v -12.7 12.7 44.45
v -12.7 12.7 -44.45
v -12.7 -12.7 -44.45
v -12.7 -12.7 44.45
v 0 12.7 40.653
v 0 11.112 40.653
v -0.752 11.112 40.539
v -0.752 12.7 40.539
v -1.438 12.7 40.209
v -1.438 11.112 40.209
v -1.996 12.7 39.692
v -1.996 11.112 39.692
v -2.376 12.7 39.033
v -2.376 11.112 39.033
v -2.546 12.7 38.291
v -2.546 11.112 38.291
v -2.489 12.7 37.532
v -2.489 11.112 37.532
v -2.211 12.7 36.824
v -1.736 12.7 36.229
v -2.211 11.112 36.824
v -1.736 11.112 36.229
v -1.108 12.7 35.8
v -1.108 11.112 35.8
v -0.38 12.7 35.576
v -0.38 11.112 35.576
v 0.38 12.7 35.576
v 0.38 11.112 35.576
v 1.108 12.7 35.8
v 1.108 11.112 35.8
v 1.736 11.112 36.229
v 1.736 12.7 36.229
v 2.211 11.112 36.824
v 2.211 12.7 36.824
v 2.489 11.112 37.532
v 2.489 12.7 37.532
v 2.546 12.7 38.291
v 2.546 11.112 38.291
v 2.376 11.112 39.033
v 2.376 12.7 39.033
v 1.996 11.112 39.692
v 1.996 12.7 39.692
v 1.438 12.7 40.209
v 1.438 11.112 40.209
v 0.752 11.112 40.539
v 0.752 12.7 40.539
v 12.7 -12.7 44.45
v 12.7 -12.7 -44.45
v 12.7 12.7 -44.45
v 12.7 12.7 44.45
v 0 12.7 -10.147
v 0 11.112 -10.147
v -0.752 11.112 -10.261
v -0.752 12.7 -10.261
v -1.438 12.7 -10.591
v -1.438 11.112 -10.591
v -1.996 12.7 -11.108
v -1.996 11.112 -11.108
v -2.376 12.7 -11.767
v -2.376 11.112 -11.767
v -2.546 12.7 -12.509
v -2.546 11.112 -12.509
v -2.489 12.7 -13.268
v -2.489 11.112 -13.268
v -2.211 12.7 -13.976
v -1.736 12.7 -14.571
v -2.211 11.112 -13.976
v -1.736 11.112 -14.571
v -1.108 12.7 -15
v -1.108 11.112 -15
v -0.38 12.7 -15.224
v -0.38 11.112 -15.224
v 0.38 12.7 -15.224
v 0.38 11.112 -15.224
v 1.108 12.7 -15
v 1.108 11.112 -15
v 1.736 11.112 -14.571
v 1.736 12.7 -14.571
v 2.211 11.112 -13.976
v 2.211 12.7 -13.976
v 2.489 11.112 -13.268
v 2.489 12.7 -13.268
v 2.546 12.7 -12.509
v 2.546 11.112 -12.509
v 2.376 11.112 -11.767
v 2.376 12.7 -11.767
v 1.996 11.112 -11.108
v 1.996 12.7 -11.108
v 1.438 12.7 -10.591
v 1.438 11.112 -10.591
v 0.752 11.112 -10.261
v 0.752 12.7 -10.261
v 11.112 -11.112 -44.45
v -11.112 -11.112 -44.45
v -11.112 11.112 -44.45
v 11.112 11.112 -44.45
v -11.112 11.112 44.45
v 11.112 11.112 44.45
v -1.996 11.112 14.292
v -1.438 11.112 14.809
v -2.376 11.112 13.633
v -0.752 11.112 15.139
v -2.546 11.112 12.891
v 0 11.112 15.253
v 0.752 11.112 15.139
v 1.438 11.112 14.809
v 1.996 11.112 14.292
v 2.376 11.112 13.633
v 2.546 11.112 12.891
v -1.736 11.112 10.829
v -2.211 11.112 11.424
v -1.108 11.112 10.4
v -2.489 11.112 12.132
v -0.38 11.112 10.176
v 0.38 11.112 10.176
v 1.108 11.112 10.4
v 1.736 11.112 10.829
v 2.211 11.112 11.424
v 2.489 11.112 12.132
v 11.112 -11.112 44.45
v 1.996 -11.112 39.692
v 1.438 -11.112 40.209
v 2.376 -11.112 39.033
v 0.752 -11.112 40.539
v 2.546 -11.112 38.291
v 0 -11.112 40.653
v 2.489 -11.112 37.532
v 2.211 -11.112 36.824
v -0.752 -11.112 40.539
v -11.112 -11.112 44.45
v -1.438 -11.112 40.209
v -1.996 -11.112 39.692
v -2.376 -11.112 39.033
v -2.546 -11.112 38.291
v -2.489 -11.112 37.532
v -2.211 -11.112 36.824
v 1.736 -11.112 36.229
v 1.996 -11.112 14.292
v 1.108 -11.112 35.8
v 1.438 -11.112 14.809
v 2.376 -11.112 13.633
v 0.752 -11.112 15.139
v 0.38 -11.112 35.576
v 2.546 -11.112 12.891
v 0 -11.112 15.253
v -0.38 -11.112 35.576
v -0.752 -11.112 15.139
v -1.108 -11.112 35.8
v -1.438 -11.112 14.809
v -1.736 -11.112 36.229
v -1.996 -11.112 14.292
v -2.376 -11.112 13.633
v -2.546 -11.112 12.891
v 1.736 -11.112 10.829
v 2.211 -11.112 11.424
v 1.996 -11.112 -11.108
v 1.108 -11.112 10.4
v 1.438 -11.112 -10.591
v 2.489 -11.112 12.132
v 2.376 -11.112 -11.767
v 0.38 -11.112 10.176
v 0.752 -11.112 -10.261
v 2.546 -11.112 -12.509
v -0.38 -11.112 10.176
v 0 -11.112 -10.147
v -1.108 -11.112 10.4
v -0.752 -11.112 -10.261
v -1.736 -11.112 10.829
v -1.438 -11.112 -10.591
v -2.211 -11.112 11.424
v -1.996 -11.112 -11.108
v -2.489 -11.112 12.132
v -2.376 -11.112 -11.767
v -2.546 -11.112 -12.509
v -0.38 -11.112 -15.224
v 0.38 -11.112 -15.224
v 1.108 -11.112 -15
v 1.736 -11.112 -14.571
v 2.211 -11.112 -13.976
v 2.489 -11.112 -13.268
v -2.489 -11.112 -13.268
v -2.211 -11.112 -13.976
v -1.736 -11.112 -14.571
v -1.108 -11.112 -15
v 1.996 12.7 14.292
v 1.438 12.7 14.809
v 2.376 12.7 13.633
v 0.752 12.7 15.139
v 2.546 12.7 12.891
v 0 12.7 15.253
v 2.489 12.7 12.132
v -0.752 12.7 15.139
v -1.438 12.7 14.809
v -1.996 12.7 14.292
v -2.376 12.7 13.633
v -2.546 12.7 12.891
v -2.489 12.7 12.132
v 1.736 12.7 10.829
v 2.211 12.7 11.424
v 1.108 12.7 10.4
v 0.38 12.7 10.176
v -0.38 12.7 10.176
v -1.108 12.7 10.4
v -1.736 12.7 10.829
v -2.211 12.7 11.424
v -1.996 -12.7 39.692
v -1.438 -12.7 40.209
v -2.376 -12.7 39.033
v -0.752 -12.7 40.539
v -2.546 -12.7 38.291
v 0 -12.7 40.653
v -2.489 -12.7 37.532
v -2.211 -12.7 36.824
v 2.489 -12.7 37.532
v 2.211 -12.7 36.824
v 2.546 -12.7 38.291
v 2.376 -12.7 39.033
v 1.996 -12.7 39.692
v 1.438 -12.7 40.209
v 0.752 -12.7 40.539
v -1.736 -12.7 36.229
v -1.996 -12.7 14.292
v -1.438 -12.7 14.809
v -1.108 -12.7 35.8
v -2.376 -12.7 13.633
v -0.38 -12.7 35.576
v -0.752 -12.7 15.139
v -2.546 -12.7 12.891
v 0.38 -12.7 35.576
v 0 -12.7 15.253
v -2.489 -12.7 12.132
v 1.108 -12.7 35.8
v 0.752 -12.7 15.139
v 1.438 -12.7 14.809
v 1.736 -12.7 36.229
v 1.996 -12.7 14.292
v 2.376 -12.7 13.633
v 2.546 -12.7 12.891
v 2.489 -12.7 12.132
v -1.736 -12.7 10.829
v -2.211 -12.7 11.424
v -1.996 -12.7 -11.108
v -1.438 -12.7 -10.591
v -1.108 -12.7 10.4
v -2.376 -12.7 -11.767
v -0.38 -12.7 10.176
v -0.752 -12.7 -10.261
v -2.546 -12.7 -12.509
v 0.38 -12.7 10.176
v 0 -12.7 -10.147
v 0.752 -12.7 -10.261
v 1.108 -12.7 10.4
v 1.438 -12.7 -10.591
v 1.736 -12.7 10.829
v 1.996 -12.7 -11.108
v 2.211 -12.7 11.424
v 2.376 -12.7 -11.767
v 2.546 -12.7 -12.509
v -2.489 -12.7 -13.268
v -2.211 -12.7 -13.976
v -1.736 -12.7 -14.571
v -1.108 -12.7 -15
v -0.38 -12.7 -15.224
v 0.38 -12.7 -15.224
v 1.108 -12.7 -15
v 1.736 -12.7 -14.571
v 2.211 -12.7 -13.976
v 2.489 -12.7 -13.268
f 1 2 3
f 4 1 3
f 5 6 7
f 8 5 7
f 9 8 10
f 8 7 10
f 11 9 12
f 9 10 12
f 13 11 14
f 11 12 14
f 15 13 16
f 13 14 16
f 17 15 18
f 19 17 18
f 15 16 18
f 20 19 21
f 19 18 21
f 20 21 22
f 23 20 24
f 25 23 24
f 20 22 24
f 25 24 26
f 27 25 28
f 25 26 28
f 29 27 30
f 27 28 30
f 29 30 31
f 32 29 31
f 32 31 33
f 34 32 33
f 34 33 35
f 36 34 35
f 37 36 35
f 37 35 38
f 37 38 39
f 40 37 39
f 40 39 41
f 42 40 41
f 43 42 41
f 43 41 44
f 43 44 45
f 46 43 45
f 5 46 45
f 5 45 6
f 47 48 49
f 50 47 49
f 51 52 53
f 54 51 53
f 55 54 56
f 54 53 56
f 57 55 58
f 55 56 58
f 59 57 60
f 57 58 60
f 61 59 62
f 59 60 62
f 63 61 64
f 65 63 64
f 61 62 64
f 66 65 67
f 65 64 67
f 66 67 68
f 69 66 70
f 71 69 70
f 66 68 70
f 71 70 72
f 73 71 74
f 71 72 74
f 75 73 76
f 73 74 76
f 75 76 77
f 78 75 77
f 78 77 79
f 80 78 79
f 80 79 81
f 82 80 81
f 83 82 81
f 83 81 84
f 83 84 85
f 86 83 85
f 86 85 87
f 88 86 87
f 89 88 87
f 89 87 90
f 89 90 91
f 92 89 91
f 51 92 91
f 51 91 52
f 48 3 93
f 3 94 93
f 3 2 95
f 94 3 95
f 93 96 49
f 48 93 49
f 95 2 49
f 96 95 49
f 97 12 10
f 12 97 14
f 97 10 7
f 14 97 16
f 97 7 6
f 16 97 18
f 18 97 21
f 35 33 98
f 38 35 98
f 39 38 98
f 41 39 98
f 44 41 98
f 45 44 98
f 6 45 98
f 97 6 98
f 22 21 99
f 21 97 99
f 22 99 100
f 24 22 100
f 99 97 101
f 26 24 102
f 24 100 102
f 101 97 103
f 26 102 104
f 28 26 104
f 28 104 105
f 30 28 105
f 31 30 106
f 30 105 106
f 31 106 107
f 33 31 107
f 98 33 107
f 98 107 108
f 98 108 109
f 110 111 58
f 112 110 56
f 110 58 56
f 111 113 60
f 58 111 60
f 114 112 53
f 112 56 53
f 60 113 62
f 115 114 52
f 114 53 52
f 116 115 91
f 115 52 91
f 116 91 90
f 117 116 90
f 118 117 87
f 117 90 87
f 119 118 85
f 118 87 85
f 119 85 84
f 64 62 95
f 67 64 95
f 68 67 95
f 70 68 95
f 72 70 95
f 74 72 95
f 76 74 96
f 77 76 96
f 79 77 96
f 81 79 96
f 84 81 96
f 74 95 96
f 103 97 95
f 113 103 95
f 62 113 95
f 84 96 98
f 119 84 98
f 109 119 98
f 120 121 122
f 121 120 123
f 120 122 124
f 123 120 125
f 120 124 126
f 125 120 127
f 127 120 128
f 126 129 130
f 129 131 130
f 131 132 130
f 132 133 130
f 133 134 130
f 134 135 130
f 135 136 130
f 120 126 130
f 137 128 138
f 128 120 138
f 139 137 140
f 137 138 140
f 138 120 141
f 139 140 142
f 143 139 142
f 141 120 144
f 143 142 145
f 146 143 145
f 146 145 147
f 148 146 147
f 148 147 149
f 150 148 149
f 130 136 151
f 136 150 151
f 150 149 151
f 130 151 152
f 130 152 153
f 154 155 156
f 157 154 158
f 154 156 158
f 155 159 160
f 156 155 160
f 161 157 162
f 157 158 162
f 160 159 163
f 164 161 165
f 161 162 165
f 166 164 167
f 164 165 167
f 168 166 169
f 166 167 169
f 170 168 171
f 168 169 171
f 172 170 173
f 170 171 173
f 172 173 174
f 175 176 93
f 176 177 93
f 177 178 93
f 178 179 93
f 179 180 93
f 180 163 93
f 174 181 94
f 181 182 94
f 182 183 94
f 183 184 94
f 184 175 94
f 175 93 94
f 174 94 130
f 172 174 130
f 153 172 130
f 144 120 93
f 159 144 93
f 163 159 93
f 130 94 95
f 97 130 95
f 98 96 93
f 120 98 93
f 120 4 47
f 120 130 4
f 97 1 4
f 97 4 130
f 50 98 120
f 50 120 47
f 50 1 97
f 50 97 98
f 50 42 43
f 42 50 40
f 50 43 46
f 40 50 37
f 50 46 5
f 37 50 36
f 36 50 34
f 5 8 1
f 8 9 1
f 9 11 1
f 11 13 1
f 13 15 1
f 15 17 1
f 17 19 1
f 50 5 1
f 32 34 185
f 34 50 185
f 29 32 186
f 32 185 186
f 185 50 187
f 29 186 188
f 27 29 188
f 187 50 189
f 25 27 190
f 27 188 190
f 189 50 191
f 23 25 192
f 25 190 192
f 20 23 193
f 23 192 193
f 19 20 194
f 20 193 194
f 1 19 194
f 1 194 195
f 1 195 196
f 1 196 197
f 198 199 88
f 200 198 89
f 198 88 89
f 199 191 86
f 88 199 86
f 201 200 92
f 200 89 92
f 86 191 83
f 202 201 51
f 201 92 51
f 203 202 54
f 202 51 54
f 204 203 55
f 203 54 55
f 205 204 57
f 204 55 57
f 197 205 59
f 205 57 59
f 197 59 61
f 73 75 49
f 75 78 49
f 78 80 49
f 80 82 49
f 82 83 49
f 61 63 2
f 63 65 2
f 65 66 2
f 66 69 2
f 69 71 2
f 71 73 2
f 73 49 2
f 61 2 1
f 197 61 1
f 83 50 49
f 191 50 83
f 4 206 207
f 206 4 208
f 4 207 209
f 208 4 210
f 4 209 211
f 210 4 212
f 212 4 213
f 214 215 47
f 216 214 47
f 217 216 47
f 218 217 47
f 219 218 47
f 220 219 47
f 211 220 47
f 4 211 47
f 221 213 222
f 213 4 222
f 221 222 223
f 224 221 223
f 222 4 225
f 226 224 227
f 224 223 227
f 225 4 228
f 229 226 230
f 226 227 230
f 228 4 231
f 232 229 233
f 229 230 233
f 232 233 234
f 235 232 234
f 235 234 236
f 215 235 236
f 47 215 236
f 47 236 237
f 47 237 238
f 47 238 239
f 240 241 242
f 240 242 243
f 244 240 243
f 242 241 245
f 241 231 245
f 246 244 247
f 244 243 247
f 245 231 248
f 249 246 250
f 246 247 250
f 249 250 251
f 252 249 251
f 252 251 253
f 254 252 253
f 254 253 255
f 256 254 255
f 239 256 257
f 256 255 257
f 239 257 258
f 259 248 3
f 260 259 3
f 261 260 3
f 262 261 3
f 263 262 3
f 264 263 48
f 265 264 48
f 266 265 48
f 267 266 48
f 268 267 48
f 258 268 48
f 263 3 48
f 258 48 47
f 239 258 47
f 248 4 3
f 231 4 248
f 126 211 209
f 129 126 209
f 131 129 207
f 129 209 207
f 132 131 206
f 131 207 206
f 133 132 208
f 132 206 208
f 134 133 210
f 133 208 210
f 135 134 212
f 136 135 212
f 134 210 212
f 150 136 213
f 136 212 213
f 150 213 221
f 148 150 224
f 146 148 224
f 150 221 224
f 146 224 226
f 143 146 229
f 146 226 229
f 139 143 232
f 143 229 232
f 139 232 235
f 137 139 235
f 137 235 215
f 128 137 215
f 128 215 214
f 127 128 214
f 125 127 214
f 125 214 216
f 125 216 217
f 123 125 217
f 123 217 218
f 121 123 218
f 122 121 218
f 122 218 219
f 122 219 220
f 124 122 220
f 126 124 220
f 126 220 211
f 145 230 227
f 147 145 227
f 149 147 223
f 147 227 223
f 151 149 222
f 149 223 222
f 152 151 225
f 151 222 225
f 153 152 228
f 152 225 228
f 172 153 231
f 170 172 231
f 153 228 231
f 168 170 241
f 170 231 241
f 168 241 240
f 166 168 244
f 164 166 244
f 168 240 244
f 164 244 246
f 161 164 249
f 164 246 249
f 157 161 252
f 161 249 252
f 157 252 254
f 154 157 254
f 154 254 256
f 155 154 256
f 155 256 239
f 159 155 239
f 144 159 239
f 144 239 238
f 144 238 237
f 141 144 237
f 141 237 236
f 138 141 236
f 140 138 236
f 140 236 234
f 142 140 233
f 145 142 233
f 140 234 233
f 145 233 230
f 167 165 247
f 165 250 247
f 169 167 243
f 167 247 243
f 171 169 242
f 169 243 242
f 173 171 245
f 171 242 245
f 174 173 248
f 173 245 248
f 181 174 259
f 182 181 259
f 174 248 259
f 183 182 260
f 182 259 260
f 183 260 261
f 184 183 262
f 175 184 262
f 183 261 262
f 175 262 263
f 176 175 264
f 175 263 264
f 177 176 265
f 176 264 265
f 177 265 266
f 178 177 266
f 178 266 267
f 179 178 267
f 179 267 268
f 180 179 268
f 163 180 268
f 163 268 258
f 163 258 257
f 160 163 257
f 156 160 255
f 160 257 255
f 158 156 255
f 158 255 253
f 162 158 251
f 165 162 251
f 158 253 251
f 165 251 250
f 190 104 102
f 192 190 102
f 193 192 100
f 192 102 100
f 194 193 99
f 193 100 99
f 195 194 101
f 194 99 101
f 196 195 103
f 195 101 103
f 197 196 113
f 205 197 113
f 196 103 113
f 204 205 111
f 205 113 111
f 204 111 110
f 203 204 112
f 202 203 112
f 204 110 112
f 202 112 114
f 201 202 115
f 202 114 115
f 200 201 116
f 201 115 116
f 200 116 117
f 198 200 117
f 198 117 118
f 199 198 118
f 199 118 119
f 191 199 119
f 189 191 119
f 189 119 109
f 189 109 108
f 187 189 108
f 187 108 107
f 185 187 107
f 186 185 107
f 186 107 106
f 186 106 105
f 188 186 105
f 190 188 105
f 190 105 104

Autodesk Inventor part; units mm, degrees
ref_plane "YZ Plane" through (0, 0, 0) normal (1, 0, 0) x (0, 1, 0)
ref_plane "XZ Plane" through (0, 0, 0) normal (0, 1, 0) x (-1, 0, 0)
ref_plane "XY Plane" through (0, 0, 0) normal (0, 0, 1) x (1, 0, 0)
sketch "Sketch1" plane through (0, 0, 0) normal (0, 0, 1) x (1, 0, 0)
  line L0 (-12.7, -12.7) -> (12.7, -12.7)
  line L1 (12.7, -12.7) -> (12.7, 12.7)
  line L2 (12.7, 12.7) -> (-12.7, 12.7)
  line L3 (-12.7, 12.7) -> (-12.7, -12.7)
  line L4 (-12.7, -12.7) -> (12.7, 12.7) construction
  line L5 (12.7, -12.7) -> (-12.7, 12.7) construction
  line L6 (11.1125, -11.1125) -> (-11.1125, -11.1125)
  line L7 (-11.1125, -11.1125) -> (-11.1125, 11.1125)
  line L8 (-11.1125, 11.1125) -> (11.1125, 11.1125)
  line L9 (11.1125, 11.1125) -> (11.1125, -11.1125)
  line L10 (11.1125, -11.1125) -> (-11.1125, 11.1125) construction
  line L11 (-11.1125, -11.1125) -> (11.1125, 11.1125) construction
  point P0 (0, 0)
  dimension "d0" = 25.4
  dimension "d1" = 25.4
  dimension "d3" = 22.225
  dimension "d4" = 22.225
extrude "Extrusion1" add sketch "Sketch1" along normal mid plane 88.9
sketch "Sketch2" plane through (-12.7, 12.7, 44.45) normal (0, 1, 0) x (1, 0, 0)
  line L0 (25.4, 0) -> (0, 0) projected
  point P0 (12.7, 44.45)
  point P1 (12.7, 6.35)
  point P2 (12.7, 31.75)
  point P3 (12.7, 57.15)
  point P4 (12.7, 0)
  point P5 (12.7, 0)
  dimension "d7" = 6.35
  dimension "d8" = 25.4
  dimension "d9" = 25.4
hole "Hole1" at (0, 12.7, 38.1) at (0, 12.7, 12.7) at (0, 12.7, -12.7) direction (0, -1, 0) diameter 5.1054 end through all clearance for "Flat Head Machine Screw (82)" size "#10" standard "Ansi Unified Screw Threads"
properties part number "DB1-006" material "Aluminum 6061"
